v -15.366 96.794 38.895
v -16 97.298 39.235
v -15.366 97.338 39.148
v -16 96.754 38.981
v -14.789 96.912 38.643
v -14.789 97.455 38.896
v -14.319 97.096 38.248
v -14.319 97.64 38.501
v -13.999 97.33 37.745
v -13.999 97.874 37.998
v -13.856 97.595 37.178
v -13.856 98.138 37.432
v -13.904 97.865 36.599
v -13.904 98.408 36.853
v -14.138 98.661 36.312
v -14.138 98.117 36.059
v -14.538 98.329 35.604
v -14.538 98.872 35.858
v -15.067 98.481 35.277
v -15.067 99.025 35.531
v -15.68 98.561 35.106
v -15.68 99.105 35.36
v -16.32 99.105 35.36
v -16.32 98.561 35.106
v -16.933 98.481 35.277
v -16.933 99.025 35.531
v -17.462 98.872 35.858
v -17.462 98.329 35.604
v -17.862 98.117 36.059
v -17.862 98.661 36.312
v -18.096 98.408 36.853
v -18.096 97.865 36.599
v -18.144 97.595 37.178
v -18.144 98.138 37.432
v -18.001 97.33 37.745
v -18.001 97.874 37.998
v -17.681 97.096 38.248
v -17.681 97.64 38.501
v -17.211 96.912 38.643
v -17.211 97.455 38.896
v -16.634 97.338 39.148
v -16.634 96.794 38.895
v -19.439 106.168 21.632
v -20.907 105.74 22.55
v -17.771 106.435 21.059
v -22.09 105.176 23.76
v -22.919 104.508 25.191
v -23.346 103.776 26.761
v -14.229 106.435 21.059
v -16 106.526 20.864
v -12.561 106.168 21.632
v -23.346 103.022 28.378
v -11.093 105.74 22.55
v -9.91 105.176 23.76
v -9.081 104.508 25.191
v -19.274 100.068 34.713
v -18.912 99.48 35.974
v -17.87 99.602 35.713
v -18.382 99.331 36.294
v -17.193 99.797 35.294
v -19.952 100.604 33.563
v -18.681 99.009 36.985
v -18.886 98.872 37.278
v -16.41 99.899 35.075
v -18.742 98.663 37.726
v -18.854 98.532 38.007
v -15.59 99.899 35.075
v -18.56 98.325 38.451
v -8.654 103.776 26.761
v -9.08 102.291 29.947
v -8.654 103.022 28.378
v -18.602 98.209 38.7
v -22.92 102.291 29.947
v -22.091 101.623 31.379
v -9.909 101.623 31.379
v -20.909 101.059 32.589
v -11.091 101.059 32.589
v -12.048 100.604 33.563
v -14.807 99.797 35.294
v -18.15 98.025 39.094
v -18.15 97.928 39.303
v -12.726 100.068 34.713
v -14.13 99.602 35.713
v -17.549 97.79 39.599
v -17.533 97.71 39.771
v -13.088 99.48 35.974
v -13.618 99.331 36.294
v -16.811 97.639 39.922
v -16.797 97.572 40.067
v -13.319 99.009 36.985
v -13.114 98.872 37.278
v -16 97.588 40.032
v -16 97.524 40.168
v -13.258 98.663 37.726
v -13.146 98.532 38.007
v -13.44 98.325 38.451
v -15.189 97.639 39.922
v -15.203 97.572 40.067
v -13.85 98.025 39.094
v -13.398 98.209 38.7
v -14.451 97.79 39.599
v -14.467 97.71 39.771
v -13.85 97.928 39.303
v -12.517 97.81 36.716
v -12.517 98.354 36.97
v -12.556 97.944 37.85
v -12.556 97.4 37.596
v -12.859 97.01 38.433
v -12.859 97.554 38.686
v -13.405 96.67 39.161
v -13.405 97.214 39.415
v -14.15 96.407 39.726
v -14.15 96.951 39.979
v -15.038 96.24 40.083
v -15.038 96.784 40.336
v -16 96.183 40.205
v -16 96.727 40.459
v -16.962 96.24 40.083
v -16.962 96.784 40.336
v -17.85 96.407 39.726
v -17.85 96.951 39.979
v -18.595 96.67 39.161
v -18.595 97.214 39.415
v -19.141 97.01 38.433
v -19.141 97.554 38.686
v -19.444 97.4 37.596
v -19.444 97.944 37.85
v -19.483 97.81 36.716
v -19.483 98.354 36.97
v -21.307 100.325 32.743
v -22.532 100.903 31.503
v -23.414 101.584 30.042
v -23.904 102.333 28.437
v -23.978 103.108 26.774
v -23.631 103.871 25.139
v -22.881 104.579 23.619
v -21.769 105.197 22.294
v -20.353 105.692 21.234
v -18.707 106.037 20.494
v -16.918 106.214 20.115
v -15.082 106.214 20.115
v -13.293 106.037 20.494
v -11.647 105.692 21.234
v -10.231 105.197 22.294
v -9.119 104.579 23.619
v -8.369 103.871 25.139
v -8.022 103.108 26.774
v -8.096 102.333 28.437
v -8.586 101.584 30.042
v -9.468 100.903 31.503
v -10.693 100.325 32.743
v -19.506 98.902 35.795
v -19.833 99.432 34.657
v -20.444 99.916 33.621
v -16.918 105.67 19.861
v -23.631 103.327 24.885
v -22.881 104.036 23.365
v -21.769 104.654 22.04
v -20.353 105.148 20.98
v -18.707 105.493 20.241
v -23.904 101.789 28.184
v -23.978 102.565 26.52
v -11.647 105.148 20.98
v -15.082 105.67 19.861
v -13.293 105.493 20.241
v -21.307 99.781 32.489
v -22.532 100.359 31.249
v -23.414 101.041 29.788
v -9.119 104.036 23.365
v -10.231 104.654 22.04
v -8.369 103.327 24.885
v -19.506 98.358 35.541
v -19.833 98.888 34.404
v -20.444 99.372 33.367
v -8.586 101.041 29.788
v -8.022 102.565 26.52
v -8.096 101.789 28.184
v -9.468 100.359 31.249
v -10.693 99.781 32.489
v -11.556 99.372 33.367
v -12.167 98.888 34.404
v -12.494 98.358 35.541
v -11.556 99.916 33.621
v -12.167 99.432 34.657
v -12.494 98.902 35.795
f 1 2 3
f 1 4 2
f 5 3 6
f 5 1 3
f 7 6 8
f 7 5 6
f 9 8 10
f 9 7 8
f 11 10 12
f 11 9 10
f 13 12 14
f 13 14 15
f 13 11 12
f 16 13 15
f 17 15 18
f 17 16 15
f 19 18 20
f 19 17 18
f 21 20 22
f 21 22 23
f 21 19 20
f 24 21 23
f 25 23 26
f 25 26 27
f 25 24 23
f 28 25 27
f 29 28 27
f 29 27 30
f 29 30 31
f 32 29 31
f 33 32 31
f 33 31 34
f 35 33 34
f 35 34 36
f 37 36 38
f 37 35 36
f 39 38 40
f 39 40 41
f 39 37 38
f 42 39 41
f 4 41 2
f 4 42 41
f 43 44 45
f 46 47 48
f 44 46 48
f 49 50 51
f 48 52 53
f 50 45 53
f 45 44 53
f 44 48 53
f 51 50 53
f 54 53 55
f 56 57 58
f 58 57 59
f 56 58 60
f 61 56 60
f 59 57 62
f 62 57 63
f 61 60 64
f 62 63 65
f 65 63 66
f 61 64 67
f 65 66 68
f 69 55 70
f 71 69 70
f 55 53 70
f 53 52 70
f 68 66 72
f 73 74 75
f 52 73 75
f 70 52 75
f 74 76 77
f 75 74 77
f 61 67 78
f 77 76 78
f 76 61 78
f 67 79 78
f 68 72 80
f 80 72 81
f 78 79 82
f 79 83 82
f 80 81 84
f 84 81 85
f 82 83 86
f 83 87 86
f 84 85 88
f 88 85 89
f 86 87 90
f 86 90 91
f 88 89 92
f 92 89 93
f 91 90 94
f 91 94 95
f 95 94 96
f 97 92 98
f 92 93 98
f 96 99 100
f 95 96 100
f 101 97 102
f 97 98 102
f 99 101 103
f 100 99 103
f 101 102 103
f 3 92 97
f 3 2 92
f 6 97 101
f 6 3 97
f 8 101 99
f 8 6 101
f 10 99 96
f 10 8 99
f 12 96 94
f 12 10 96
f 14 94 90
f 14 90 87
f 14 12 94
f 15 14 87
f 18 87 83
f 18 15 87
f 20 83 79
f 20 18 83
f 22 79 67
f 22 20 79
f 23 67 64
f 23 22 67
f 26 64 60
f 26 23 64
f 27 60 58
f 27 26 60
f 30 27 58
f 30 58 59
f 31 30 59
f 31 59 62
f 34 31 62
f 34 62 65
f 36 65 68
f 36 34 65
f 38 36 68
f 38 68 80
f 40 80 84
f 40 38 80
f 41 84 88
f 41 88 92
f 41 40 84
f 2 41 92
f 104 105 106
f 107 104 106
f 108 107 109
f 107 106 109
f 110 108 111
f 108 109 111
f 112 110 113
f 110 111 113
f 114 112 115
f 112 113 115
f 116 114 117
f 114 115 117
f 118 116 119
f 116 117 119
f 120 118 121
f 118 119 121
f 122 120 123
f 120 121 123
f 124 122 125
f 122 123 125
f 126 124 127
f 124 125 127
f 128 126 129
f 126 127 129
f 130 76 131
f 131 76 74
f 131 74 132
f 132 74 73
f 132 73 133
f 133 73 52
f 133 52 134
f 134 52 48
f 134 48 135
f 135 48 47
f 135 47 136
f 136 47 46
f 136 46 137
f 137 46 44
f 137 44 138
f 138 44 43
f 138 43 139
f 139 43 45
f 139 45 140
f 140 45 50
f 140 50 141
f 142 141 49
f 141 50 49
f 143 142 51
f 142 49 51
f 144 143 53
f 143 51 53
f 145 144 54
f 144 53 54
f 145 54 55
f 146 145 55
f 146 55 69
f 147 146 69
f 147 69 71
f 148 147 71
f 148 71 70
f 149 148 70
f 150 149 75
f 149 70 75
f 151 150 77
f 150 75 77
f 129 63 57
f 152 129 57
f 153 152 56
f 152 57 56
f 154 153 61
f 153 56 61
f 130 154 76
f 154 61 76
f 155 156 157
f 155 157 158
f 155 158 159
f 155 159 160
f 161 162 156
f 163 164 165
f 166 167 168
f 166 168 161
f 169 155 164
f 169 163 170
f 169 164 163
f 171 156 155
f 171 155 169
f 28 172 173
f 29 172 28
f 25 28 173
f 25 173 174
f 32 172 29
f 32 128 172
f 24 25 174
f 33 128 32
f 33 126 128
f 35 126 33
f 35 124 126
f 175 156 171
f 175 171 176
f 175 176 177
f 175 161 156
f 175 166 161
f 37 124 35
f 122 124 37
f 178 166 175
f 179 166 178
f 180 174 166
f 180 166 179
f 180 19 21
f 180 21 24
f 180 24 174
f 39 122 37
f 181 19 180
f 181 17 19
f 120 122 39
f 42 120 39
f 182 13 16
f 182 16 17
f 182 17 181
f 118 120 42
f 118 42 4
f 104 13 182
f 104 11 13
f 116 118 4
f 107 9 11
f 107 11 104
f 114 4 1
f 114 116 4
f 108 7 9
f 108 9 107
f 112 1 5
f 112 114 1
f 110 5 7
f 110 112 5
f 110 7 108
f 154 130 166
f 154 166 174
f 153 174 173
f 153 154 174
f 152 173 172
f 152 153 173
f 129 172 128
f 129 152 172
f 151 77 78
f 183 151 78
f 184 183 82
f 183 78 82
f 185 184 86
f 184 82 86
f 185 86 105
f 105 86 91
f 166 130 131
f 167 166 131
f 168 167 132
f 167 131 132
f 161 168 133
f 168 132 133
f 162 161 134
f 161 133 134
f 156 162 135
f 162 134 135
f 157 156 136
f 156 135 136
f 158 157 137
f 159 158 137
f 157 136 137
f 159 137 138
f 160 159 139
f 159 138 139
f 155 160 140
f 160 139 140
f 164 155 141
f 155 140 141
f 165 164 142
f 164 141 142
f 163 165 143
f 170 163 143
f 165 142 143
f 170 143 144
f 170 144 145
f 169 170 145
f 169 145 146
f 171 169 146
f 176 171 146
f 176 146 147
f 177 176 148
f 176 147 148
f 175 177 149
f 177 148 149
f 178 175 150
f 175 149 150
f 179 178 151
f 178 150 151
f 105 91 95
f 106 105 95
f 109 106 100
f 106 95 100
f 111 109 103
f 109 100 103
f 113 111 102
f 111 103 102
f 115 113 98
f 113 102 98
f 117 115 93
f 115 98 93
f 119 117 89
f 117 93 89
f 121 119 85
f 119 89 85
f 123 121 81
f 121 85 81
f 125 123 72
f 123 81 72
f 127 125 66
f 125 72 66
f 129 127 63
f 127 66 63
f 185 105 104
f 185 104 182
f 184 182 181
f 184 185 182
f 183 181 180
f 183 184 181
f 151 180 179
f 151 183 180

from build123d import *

# Parameters (mm, degrees)
PAD_DEPTH            = 1.2
CHAMFER_SIZE         = 0.6
BODY_PLACEMENT_ANGLE = 25


with BuildPart() as part:
    # Sketch027 → Pad (new body)
    with BuildSketch(Plane.XZ):
        with BuildLine():
            ThreePointArc((-5.306735, -5.013468), (0, -19), (5.306735, -5.013468))
            ThreePointArc((3.482545, -0.349116), (3.832911, -2.90098), (5.306735, -5.013468))
            ThreePointArc((3.482545, -0.349116), (0, 3.5), (-3.482545, -0.349116))
            ThreePointArc((-5.306735, -5.013468), (-3.832911, -2.90098), (-3.482545, -0.349116))
        make_face()
    extrude(amount=PAD_DEPTH)

    # Sketch030 → Groove (revolve, cut)
    with BuildSketch(Plane.YZ):
        Polygon((0, 2.75), (-0.6, 2.15), (-1.2, 2.15), (-1.2, 0), (0, 0), align=None)
    revolve(axis=Axis((0, 0, 0), (0, 1, 0)), mode=Mode.SUBTRACT)

    # Chamfer
    chamfer_edges = [part.edges().sort_by_distance(p)[0] for p in [
        (0, 0, -19),
    ]]
    chamfer(chamfer_edges, length=CHAMFER_SIZE)


with BuildPart() as part_1:
    # Body placement: moved
    add(part.part.moved(Location((-16, 98.75, 37.54))).rotate(Axis((-16, 98.75, 37.54), (1, 0, 0)), BODY_PLACEMENT_ANGLE))


solid = part_1.part
